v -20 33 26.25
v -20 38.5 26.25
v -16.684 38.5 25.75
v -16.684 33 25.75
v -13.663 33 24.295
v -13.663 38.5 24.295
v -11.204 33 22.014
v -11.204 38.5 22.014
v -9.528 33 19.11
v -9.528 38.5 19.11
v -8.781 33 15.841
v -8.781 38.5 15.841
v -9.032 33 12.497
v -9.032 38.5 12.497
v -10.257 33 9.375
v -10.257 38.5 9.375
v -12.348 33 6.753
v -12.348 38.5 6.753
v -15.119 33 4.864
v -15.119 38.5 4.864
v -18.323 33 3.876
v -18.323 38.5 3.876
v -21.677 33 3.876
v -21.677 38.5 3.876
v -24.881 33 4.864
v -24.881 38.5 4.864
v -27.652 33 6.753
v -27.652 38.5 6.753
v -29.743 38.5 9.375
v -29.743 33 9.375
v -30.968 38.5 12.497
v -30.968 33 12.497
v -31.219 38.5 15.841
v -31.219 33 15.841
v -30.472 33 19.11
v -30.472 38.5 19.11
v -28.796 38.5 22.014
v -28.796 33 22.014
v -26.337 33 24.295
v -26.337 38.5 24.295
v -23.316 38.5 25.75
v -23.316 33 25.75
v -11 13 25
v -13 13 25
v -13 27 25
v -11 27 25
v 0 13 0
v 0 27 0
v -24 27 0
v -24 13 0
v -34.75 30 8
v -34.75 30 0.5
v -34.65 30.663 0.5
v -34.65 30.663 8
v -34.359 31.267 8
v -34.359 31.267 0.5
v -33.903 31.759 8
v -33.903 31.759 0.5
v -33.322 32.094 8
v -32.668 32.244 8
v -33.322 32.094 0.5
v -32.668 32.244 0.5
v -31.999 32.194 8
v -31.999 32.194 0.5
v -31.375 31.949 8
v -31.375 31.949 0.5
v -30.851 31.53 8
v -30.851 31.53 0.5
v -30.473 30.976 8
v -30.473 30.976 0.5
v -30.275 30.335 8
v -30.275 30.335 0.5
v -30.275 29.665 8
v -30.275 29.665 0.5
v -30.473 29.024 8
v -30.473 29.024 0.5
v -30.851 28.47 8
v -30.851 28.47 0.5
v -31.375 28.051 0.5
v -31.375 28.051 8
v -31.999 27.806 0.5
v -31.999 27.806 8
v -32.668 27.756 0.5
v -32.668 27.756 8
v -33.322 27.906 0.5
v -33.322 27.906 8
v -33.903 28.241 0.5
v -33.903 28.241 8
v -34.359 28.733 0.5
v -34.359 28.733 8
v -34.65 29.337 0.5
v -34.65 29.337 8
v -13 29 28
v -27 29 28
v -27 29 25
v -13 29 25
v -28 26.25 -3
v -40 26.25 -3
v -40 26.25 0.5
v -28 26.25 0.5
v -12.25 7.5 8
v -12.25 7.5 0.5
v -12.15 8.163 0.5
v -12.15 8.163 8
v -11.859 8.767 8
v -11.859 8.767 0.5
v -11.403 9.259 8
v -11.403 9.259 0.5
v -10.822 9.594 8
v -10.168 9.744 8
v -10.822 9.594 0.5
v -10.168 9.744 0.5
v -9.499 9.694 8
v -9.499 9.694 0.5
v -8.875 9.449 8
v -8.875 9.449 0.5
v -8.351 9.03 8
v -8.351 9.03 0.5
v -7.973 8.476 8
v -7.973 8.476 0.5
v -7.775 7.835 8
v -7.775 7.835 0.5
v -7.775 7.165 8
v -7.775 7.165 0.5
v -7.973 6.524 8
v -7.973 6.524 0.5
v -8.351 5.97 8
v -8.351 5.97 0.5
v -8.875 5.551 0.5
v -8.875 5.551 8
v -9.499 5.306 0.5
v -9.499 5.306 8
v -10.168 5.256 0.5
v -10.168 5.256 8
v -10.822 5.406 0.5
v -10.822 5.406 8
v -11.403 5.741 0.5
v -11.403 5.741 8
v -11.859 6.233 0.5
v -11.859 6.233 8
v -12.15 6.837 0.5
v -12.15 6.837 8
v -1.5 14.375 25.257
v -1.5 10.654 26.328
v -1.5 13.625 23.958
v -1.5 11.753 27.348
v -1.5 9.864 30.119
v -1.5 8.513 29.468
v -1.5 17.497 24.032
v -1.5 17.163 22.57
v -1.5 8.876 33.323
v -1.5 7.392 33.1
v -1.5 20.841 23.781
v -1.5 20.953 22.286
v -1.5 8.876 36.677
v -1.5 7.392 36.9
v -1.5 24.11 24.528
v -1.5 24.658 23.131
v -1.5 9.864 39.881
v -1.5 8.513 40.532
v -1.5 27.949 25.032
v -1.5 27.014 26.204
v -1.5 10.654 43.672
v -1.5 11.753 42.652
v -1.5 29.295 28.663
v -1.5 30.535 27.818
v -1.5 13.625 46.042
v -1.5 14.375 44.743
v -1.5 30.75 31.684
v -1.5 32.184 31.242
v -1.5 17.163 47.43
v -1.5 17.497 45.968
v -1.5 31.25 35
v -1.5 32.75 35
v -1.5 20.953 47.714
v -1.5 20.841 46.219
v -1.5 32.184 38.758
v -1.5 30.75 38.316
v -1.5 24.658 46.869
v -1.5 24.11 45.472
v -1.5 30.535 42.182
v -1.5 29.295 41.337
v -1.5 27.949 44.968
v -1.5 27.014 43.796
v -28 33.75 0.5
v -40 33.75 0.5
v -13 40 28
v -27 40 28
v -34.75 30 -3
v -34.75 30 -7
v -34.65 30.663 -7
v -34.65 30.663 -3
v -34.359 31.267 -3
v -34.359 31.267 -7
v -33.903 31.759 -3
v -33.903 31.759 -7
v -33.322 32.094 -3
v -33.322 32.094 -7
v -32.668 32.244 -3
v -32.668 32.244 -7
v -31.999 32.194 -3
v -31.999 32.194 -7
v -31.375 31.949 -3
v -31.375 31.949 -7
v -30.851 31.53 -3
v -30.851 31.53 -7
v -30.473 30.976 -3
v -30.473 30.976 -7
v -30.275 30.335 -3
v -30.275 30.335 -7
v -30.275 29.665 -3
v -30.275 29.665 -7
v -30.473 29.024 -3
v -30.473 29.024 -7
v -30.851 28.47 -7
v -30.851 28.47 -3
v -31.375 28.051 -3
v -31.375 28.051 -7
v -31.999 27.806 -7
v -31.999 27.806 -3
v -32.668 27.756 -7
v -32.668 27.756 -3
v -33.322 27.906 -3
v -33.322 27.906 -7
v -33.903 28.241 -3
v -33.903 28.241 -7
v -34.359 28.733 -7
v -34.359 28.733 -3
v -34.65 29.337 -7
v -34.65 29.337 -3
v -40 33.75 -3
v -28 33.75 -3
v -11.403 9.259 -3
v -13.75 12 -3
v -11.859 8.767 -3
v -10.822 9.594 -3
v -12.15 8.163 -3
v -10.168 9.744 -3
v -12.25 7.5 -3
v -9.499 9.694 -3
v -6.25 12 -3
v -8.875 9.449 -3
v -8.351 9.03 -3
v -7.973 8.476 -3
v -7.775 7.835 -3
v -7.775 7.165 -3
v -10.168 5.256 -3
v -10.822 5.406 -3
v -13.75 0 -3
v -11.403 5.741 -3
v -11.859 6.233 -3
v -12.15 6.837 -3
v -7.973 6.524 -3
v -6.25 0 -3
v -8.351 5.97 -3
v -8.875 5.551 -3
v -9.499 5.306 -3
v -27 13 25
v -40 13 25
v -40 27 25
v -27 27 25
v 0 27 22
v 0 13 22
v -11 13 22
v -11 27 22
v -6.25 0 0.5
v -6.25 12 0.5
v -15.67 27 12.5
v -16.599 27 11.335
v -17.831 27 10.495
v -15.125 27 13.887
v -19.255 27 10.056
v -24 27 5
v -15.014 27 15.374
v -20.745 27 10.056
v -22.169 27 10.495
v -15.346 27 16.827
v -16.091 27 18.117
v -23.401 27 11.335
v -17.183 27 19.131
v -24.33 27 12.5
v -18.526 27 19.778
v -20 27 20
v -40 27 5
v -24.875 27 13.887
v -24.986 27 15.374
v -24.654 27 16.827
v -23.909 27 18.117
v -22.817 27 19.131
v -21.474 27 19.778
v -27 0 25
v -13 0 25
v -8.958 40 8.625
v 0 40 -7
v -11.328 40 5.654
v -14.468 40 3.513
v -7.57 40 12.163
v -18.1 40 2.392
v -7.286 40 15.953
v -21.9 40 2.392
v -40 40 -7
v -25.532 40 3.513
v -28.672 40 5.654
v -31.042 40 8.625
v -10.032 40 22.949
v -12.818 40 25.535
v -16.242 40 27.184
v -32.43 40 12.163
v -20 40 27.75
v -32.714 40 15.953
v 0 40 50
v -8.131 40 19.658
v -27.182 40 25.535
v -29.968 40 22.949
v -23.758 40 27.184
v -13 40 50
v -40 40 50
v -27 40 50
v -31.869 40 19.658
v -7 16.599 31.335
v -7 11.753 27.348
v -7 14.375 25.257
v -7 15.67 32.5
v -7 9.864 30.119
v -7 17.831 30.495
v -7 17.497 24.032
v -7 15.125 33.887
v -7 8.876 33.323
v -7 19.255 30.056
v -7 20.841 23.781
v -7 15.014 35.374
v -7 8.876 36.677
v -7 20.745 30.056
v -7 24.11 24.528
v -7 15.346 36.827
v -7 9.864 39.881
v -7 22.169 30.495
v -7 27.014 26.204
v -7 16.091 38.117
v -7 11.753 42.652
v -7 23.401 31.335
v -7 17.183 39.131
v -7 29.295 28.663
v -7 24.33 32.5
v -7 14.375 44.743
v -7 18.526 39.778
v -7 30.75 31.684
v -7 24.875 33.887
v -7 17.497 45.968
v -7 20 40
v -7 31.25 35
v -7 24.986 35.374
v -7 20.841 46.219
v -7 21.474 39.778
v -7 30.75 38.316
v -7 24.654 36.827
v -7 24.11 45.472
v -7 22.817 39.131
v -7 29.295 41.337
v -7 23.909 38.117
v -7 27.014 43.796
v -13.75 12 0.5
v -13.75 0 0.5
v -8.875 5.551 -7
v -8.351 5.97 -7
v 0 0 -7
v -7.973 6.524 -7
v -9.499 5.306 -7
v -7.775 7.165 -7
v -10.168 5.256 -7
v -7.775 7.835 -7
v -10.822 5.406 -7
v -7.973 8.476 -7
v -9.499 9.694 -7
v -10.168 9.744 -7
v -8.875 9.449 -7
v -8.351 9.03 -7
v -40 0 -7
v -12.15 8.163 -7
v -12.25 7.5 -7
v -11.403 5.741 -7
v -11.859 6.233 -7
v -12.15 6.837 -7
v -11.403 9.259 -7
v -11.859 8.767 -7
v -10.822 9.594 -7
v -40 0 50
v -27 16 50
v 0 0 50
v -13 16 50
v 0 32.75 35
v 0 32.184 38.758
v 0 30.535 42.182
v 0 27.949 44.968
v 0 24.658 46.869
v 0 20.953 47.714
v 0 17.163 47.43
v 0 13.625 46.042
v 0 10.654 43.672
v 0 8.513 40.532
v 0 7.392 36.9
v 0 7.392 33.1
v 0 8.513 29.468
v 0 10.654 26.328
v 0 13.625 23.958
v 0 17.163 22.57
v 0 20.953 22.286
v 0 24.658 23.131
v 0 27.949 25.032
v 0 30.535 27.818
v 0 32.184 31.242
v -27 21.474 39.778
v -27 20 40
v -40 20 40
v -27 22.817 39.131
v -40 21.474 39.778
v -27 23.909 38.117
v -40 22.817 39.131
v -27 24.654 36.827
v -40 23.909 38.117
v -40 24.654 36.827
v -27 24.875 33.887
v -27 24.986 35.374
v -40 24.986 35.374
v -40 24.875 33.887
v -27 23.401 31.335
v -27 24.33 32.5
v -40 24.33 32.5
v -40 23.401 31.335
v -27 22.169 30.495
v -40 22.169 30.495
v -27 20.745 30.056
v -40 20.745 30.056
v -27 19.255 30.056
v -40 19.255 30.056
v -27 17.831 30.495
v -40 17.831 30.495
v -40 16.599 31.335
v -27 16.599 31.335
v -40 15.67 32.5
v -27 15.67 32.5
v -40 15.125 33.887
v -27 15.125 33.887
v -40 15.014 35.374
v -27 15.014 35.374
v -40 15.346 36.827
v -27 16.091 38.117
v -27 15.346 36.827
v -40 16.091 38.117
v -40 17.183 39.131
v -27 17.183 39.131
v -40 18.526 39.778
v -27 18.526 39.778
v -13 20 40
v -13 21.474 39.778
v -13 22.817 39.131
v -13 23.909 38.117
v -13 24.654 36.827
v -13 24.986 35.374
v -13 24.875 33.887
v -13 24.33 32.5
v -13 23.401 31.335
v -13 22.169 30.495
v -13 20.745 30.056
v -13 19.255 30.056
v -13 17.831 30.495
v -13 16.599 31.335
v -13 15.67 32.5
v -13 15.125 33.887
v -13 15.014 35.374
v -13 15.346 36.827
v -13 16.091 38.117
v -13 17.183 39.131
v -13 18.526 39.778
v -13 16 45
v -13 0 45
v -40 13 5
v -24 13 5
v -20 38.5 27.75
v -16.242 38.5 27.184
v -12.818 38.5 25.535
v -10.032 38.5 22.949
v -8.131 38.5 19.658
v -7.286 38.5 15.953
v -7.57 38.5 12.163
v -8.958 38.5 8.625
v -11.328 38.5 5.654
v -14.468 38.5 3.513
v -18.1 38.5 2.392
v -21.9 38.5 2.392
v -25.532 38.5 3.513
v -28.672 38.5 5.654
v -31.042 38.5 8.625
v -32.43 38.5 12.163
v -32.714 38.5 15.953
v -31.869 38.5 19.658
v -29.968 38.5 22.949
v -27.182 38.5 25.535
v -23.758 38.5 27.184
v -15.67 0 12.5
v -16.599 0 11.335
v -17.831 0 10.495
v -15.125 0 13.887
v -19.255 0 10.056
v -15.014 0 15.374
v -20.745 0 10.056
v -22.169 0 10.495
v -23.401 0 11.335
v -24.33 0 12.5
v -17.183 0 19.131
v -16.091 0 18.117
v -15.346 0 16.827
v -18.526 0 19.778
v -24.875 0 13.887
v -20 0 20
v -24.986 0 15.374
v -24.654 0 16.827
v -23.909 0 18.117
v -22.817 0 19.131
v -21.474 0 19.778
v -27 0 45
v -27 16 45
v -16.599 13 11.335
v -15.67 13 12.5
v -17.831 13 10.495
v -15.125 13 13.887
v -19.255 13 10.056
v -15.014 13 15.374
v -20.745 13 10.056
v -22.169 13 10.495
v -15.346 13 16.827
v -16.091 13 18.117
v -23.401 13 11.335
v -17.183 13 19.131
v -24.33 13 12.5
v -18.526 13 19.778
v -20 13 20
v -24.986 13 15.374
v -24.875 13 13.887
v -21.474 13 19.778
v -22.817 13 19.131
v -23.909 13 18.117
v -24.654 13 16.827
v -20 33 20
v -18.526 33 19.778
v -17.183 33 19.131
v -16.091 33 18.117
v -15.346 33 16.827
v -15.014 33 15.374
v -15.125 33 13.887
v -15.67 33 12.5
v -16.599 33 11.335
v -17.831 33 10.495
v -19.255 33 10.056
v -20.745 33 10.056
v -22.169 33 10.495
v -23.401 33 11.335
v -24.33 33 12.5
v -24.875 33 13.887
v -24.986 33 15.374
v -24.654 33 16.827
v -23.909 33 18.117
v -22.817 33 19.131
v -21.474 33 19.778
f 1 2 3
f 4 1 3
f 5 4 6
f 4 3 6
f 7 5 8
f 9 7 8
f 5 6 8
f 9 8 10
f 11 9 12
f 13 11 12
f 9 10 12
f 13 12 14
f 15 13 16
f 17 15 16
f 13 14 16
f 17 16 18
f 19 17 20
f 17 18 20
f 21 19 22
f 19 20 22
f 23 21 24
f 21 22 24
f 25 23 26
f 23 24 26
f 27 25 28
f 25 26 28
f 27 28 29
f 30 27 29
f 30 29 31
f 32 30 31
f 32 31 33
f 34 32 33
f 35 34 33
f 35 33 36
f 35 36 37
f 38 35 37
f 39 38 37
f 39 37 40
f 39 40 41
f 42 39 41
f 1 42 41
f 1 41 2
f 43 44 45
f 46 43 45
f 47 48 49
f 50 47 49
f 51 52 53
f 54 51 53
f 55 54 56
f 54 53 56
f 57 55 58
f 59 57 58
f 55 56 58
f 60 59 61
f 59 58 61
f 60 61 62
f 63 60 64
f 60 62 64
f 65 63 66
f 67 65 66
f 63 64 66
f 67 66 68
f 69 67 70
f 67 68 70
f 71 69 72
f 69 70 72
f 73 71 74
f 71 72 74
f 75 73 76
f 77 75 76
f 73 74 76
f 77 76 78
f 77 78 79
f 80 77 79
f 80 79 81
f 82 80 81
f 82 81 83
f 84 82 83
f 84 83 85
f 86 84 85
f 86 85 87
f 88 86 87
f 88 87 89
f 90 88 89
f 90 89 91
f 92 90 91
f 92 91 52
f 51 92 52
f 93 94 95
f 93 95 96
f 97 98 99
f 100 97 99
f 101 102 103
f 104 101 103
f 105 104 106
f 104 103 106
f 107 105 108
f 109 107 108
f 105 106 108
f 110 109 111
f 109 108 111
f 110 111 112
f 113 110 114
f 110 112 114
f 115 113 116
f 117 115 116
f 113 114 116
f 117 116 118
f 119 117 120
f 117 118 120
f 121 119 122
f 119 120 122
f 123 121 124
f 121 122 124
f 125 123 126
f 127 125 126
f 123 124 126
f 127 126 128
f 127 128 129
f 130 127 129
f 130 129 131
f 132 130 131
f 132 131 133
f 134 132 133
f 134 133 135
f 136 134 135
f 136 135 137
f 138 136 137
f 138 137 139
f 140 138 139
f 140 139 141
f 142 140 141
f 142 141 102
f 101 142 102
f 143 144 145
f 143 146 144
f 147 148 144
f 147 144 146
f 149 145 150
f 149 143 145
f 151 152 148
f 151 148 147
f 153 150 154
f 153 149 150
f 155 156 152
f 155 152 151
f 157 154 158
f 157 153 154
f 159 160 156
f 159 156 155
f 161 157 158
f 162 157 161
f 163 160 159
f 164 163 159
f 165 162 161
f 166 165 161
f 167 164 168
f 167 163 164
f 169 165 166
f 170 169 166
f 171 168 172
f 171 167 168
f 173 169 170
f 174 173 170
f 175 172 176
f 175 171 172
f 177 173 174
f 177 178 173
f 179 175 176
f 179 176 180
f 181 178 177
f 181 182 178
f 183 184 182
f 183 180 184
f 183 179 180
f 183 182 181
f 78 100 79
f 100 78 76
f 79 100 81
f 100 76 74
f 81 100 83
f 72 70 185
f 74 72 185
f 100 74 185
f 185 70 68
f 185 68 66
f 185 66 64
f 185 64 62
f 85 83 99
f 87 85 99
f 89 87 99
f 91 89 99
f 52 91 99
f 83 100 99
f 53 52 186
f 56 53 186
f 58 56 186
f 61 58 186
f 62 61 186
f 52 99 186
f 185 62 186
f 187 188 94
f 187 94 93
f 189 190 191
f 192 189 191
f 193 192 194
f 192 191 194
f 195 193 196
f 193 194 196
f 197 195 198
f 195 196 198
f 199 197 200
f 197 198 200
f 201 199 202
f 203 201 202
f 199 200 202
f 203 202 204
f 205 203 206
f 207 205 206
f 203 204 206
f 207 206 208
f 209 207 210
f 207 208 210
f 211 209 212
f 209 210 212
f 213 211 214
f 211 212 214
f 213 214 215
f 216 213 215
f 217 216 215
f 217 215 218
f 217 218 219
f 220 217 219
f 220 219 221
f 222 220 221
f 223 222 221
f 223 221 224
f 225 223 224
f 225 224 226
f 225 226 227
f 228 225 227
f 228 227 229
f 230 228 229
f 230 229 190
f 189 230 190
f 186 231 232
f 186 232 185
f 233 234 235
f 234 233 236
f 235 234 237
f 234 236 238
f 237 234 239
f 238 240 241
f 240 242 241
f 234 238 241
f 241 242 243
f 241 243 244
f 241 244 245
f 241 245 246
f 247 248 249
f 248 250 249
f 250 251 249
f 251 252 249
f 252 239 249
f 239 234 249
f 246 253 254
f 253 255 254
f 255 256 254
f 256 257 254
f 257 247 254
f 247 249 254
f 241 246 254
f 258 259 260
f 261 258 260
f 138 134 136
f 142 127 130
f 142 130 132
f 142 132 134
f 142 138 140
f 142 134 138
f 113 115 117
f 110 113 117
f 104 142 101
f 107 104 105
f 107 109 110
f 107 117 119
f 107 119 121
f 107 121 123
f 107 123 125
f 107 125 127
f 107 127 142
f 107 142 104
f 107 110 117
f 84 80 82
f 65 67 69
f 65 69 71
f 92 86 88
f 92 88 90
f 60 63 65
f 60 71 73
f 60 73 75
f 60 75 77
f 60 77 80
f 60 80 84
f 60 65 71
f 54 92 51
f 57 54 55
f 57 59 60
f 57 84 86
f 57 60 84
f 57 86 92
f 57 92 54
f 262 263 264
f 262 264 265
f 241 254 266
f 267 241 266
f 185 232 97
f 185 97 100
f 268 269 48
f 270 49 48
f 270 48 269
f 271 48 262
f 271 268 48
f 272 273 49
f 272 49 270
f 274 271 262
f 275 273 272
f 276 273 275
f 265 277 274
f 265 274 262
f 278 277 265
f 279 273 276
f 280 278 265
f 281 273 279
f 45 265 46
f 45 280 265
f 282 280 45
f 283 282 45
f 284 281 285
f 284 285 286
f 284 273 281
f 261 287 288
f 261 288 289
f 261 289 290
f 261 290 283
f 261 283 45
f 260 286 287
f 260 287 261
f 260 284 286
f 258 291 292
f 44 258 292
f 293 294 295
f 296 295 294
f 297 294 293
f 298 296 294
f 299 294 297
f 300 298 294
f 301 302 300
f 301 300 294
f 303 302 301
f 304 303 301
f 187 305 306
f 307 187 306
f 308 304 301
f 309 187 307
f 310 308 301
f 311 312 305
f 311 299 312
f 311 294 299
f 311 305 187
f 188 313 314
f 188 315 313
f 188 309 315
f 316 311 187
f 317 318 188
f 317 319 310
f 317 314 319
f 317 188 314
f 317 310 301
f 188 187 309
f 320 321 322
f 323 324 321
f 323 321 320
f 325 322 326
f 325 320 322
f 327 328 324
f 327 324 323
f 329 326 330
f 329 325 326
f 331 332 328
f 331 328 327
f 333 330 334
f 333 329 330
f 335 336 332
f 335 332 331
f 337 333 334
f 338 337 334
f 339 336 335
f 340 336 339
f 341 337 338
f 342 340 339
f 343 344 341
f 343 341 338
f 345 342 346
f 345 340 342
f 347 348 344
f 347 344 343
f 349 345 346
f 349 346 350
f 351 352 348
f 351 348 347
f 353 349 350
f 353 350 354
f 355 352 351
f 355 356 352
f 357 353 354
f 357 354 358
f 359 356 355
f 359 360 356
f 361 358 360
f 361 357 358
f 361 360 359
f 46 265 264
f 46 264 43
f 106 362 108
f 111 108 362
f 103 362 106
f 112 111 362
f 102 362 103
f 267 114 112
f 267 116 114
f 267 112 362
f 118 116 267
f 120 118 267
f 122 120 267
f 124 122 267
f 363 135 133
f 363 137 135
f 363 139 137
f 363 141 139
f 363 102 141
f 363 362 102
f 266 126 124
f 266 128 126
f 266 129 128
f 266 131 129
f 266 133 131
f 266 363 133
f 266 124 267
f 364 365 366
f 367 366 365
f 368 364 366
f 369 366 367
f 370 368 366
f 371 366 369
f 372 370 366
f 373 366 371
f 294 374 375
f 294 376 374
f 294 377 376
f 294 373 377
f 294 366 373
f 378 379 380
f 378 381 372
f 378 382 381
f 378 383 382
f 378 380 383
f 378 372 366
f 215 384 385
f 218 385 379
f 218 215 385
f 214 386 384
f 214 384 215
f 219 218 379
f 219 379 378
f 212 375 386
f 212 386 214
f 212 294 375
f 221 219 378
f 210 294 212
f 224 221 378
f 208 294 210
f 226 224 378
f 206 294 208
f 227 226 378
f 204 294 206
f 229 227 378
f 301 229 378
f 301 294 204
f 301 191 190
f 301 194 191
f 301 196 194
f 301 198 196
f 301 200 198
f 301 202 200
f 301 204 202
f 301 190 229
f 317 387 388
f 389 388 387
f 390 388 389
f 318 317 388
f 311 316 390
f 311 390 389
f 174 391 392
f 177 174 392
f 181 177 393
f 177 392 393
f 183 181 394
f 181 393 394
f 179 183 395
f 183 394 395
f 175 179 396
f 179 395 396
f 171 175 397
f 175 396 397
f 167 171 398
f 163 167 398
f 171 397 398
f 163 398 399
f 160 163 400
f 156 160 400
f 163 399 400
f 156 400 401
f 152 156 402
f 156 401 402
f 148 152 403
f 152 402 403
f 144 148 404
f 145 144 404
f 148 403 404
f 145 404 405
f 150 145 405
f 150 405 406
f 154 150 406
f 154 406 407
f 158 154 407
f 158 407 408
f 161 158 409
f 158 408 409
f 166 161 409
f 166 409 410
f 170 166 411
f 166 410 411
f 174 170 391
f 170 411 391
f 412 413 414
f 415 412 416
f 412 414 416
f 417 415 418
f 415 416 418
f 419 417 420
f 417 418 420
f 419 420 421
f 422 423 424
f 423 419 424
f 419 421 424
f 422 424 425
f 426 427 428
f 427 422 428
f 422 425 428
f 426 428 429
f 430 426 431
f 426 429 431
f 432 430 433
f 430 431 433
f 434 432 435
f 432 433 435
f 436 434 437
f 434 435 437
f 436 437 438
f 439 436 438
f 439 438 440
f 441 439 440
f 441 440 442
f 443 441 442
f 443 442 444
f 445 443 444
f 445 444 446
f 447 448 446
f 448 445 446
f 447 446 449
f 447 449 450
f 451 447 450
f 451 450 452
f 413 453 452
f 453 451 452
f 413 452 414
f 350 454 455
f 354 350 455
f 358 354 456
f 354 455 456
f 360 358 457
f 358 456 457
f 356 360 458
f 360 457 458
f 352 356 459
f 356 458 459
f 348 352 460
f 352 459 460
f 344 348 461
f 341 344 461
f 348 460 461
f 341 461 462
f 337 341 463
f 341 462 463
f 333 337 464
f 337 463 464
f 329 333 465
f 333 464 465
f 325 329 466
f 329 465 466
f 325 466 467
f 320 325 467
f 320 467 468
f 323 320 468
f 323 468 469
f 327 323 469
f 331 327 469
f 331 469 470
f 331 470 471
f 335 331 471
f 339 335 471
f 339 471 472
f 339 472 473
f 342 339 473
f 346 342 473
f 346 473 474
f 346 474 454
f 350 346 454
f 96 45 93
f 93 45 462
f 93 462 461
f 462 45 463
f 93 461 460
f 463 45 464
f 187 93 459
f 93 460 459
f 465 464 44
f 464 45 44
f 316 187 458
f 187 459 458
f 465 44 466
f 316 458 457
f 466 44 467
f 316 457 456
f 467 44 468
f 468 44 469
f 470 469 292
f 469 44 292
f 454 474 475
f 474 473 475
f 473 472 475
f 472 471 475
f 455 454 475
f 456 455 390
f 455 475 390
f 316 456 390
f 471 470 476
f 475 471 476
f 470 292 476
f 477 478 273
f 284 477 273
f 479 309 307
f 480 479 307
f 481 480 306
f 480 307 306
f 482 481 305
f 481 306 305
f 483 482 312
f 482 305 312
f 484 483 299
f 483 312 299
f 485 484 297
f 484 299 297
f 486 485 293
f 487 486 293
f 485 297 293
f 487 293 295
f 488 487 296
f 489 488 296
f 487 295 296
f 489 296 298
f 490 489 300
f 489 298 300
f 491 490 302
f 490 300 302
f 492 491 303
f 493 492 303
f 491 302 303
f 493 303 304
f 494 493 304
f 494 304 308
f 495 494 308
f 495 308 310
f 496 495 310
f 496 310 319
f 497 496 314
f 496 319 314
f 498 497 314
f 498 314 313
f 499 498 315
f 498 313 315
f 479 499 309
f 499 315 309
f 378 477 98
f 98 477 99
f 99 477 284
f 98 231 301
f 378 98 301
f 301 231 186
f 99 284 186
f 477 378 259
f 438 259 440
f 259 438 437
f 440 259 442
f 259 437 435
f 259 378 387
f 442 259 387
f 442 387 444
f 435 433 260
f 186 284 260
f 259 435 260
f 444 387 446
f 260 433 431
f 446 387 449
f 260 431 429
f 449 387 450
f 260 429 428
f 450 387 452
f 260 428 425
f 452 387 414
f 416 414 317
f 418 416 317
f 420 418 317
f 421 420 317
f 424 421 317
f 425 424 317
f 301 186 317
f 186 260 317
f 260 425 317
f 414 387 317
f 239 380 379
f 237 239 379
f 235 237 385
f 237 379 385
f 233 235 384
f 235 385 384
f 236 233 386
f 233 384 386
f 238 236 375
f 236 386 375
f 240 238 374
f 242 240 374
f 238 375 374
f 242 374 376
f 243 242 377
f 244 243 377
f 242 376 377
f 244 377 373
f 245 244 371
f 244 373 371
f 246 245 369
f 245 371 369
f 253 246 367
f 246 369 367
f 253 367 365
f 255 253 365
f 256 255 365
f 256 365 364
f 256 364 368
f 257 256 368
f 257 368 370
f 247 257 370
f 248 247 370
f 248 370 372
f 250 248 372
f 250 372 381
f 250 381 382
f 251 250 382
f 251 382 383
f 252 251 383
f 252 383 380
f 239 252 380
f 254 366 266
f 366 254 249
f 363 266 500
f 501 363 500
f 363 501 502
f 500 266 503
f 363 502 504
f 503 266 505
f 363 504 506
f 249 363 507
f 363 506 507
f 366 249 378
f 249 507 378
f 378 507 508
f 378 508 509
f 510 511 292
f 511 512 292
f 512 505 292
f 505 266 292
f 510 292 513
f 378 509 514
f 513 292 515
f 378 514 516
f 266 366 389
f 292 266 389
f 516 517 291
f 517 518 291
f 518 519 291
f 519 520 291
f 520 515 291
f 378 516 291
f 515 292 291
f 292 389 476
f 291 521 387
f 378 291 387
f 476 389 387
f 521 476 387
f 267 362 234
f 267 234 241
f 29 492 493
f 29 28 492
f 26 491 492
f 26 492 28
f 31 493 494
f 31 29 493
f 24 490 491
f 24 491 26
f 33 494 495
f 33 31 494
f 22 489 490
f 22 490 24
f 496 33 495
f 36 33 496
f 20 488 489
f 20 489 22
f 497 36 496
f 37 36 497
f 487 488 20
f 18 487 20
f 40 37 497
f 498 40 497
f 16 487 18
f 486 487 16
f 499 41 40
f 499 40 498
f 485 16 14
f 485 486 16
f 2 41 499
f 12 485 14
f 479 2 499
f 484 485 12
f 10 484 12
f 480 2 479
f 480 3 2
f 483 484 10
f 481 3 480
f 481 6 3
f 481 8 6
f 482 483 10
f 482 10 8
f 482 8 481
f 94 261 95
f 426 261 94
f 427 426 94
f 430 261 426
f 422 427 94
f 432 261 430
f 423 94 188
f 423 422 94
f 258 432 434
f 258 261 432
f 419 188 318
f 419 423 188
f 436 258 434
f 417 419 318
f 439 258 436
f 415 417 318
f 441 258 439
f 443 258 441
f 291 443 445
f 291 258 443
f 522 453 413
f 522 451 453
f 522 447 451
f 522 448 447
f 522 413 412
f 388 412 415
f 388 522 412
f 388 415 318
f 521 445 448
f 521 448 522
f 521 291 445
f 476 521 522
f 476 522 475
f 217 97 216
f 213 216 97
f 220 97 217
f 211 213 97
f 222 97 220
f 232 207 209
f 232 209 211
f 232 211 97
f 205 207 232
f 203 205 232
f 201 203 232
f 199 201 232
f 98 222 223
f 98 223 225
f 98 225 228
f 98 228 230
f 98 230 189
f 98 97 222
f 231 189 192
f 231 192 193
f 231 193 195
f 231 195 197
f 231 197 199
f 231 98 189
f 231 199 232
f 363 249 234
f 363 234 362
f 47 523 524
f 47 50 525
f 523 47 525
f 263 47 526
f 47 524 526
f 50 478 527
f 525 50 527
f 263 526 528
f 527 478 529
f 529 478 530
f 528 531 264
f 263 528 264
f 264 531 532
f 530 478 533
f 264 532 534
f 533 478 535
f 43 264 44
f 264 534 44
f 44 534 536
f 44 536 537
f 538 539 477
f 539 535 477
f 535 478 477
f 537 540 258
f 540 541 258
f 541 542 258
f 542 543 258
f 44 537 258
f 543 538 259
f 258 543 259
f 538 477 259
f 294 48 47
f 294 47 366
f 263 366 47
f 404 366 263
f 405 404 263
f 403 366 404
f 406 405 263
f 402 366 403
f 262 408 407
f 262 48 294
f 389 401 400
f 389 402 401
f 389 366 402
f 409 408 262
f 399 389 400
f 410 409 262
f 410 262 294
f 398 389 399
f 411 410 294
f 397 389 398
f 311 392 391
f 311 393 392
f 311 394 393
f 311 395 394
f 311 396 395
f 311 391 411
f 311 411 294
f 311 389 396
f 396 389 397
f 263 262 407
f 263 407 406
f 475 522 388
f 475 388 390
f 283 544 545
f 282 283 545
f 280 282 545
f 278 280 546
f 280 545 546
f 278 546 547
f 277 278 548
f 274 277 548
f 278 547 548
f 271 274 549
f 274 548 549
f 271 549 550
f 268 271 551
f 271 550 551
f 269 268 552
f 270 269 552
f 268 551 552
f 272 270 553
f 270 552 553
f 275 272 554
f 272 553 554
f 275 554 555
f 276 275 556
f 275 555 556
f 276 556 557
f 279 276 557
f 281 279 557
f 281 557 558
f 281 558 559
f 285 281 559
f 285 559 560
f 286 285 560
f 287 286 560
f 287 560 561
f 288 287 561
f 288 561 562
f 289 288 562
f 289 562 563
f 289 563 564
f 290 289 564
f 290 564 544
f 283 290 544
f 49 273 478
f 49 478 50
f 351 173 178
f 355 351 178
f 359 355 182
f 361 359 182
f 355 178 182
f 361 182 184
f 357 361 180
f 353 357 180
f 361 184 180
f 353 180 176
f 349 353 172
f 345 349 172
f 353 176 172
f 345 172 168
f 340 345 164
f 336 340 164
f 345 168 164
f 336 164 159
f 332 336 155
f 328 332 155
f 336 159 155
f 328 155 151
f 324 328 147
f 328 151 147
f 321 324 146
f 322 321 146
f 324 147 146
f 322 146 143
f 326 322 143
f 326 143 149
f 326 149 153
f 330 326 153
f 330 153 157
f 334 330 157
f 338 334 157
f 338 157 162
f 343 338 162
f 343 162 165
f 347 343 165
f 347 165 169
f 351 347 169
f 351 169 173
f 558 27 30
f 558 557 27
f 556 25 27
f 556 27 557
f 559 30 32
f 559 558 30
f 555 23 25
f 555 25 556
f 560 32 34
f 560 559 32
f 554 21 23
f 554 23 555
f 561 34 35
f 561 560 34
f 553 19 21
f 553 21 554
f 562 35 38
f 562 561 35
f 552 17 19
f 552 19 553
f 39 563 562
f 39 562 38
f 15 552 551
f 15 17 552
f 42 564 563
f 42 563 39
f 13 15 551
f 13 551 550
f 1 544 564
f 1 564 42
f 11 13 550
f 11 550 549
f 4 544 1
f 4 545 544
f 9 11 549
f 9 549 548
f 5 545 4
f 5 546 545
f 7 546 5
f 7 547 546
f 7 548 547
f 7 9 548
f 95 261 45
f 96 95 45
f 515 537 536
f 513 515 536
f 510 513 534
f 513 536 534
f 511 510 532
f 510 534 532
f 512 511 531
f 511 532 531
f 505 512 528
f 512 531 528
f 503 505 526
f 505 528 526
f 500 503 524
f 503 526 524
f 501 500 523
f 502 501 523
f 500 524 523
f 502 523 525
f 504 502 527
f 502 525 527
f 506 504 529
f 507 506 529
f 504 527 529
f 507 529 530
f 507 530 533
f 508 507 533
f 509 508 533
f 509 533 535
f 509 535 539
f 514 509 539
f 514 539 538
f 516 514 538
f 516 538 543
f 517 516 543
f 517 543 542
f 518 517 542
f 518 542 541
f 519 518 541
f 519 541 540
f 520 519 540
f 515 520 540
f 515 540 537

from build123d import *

# Parameters (mm, degrees)
ESQUISSE1_W              = 40
ESQUISSE1_H              = 40
BOSS_EXTRU_1_DEPTH       = 50
ESQUISSE2_R              = 5
ENL_V_MAT_EXTRU_1_DEPTH  = 41
ESQUISSE3_R              = 5
ENL_V_MAT_EXTRU_2_DEPTH  = 41
ESQUISSE4_W              = 20
ESQUISSE4_H              = 14
ENL_V_MAT_EXTRU_3_DEPTH  = 29
ESQUISSE5_W              = 14
ESQUISSE5_H              = 20
ENL_V_MAT_EXTRU_4_DEPTH  = 29
ESQUISSE6_W              = 22
ESQUISSE6_H              = 14
ENL_V_MAT_EXTRU_5_DEPTH  = 24
ESQUISSE7_W              = 14
ESQUISSE7_H              = 22
ENL_V_MAT_EXTRU_6_DEPTH  = 24
ESQUISSE8_R              = 11.25
ENL_V_MAT_EXTRU_7_DEPTH  = 7
ESQUISSE9_R              = 12.75
ENL_V_MAT_EXTRU_8_DEPTH  = 1.5
ESQUISSE10_R             = 11.25
ENL_V_MAT_EXTRU_9_DEPTH  = 7
ESQUISSE11_R             = 12.75
ENL_V_MAT_EXTRU_10_DEPTH = 1.5
ESQUISSE12_W             = 40
ESQUISSE12_H             = 40
BOSS_EXTRU_2_DEPTH       = 7
ESQUISSE13_R             = 2.25
ENL_V_MAT_EXTRU_11_DEPTH = 15
ESQUISSE14_W             = 3.5
ESQUISSE14_H             = 7.5
ENL_V_MAT_EXTRU_12_DEPTH = 12
ESQUISSE15_W             = 7.5
ESQUISSE15_H             = 3.5
ENL_V_MAT_EXTRU_13_DEPTH = 12


with BuildPart() as part:
    # Esquisse1 → Boss.-Extru.1 (new body)
    with BuildSketch(Plane.XY):
        with Locations((-20, 20)):
            Rectangle(ESQUISSE1_W, ESQUISSE1_H)
    extrude(amount=BOSS_EXTRU_1_DEPTH)

    # Esquisse2 → Enlèv. mat.-Extru.1 (cut, through all)
    with BuildSketch(Plane(origin=(0, 40, 0), x_dir=(1, 0, 0), z_dir=(0, 1, 0))):
        with Locations(Location((-20, -15, 0), (0, 0, 270))):  # turned: the seam where the file's is
            Circle(ESQUISSE2_R)
    extrude(amount=-ENL_V_MAT_EXTRU_1_DEPTH, mode=Mode.SUBTRACT)

    # Esquisse3 → Enlèv. mat.-Extru.2 (cut, through all)
    with BuildSketch(Plane.ZY.offset(40)):
        with Locations((35, 20)):
            Circle(ESQUISSE3_R)
    extrude(amount=-ENL_V_MAT_EXTRU_2_DEPTH, mode=Mode.SUBTRACT)

    # Esquisse4 → Enlèv. mat.-Extru.3 (cut)
    with BuildSketch(Plane.ZY.offset(40)):
        with Locations((15, 20)):
            Rectangle(ESQUISSE4_W, ESQUISSE4_H)
    extrude(amount=-ENL_V_MAT_EXTRU_3_DEPTH, mode=Mode.SUBTRACT)

    # Esquisse5 → Enlèv. mat.-Extru.4 (cut)
    with BuildSketch(Plane.XZ):
        with Locations((-20, 35)):
            Rectangle(ESQUISSE5_W, ESQUISSE5_H)
    extrude(amount=-ENL_V_MAT_EXTRU_4_DEPTH, mode=Mode.SUBTRACT)

    # Esquisse6 → Enlèv. mat.-Extru.5 (cut)
    with BuildSketch(Plane(origin=(0, 0, 0), x_dir=(0, 0, -1), z_dir=(1, 0, 0))):
        with Locations((-11, 20)):
            Rectangle(ESQUISSE6_W, ESQUISSE6_H)
    extrude(amount=-ENL_V_MAT_EXTRU_5_DEPTH, mode=Mode.SUBTRACT)

    # Esquisse7 → Enlèv. mat.-Extru.6 (cut)
    with BuildSketch(Plane(origin=(0, 40, 0), x_dir=(1, 0, 0), z_dir=(0, 1, 0))):
        with Locations((-20, -39)):
            Rectangle(ESQUISSE7_W, ESQUISSE7_H)
    extrude(amount=-ENL_V_MAT_EXTRU_6_DEPTH, mode=Mode.SUBTRACT)

    # Esquisse8 → Enlèv. mat.-Extru.7 (cut)
    with BuildSketch(Plane(origin=(0, 0, 0), x_dir=(0, 0, -1), z_dir=(1, 0, 0))):
        with Locations(Location((-35, 20, 0), (0, 0, 90))):  # turned: the seam where the file's is
            Circle(ESQUISSE8_R)
    extrude(amount=-ENL_V_MAT_EXTRU_7_DEPTH, mode=Mode.SUBTRACT)

    # Esquisse9 → Enlèv. mat.-Extru.8 (cut)
    with BuildSketch(Plane(origin=(0, 0, 0), x_dir=(0, 0, -1), z_dir=(1, 0, 0))):
        with Locations(Location((-35, 20, 0), (0, 0, 90))):  # turned: the seam where the file's is
            Circle(ESQUISSE9_R)
    extrude(amount=-ENL_V_MAT_EXTRU_8_DEPTH, mode=Mode.SUBTRACT)

    # Esquisse10 → Enlèv. mat.-Extru.9 (cut)
    with BuildSketch(Plane(origin=(0, 40, 0), x_dir=(1, 0, 0), z_dir=(0, 1, 0))):
        with Locations(Location((-20, -15, 0), (0, 0, 270))):  # turned: the seam where the file's is
            Circle(ESQUISSE10_R)
    extrude(amount=-ENL_V_MAT_EXTRU_9_DEPTH, mode=Mode.SUBTRACT)

    # Esquisse11 → Enlèv. mat.-Extru.10 (cut)
    with BuildSketch(Plane(origin=(0, 40, 0), x_dir=(1, 0, 0), z_dir=(0, 1, 0))):
        with Locations(Location((-20, -15, 0), (0, 0, 270))):  # turned: the seam where the file's is
            Circle(ESQUISSE11_R)
    extrude(amount=-ENL_V_MAT_EXTRU_10_DEPTH, mode=Mode.SUBTRACT)

    # Esquisse12 → Boss.-Extru.2 (add)
    with BuildSketch(Plane(origin=(0, 0, 0), x_dir=(-1, 0, 0), z_dir=(0, 0, -1))):
        with Locations((20, 20)):
            Rectangle(ESQUISSE12_W, ESQUISSE12_H)
    extrude(amount=BOSS_EXTRU_2_DEPTH)

    # Esquisse13 → Enlèv. mat.-Extru.11 (cut)
    with BuildSketch(Plane(origin=(0, 0, -7), x_dir=(-1, 0, 0), z_dir=(0, 0, -1))):
        with Locations((10, 7.5)):
            Circle(ESQUISSE13_R)
        with Locations((32.5, 30)):
            Circle(ESQUISSE13_R)
    extrude(amount=-ENL_V_MAT_EXTRU_11_DEPTH, mode=Mode.SUBTRACT)

    # Esquisse14 → Enlèv. mat.-Extru.12 (cut)
    with BuildSketch(Plane.ZY.offset(40)):
        with Locations((-1.25, 30)):
            Rectangle(ESQUISSE14_W, ESQUISSE14_H)
    extrude(amount=-ENL_V_MAT_EXTRU_12_DEPTH, mode=Mode.SUBTRACT)

    # Esquisse15 → Enlèv. mat.-Extru.13 (cut)
    with BuildSketch(Plane.XZ):
        with Locations((-10, -1.25)):
            Rectangle(ESQUISSE15_W, ESQUISSE15_H)
    extrude(amount=-ENL_V_MAT_EXTRU_13_DEPTH, mode=Mode.SUBTRACT)


solid = part.part
